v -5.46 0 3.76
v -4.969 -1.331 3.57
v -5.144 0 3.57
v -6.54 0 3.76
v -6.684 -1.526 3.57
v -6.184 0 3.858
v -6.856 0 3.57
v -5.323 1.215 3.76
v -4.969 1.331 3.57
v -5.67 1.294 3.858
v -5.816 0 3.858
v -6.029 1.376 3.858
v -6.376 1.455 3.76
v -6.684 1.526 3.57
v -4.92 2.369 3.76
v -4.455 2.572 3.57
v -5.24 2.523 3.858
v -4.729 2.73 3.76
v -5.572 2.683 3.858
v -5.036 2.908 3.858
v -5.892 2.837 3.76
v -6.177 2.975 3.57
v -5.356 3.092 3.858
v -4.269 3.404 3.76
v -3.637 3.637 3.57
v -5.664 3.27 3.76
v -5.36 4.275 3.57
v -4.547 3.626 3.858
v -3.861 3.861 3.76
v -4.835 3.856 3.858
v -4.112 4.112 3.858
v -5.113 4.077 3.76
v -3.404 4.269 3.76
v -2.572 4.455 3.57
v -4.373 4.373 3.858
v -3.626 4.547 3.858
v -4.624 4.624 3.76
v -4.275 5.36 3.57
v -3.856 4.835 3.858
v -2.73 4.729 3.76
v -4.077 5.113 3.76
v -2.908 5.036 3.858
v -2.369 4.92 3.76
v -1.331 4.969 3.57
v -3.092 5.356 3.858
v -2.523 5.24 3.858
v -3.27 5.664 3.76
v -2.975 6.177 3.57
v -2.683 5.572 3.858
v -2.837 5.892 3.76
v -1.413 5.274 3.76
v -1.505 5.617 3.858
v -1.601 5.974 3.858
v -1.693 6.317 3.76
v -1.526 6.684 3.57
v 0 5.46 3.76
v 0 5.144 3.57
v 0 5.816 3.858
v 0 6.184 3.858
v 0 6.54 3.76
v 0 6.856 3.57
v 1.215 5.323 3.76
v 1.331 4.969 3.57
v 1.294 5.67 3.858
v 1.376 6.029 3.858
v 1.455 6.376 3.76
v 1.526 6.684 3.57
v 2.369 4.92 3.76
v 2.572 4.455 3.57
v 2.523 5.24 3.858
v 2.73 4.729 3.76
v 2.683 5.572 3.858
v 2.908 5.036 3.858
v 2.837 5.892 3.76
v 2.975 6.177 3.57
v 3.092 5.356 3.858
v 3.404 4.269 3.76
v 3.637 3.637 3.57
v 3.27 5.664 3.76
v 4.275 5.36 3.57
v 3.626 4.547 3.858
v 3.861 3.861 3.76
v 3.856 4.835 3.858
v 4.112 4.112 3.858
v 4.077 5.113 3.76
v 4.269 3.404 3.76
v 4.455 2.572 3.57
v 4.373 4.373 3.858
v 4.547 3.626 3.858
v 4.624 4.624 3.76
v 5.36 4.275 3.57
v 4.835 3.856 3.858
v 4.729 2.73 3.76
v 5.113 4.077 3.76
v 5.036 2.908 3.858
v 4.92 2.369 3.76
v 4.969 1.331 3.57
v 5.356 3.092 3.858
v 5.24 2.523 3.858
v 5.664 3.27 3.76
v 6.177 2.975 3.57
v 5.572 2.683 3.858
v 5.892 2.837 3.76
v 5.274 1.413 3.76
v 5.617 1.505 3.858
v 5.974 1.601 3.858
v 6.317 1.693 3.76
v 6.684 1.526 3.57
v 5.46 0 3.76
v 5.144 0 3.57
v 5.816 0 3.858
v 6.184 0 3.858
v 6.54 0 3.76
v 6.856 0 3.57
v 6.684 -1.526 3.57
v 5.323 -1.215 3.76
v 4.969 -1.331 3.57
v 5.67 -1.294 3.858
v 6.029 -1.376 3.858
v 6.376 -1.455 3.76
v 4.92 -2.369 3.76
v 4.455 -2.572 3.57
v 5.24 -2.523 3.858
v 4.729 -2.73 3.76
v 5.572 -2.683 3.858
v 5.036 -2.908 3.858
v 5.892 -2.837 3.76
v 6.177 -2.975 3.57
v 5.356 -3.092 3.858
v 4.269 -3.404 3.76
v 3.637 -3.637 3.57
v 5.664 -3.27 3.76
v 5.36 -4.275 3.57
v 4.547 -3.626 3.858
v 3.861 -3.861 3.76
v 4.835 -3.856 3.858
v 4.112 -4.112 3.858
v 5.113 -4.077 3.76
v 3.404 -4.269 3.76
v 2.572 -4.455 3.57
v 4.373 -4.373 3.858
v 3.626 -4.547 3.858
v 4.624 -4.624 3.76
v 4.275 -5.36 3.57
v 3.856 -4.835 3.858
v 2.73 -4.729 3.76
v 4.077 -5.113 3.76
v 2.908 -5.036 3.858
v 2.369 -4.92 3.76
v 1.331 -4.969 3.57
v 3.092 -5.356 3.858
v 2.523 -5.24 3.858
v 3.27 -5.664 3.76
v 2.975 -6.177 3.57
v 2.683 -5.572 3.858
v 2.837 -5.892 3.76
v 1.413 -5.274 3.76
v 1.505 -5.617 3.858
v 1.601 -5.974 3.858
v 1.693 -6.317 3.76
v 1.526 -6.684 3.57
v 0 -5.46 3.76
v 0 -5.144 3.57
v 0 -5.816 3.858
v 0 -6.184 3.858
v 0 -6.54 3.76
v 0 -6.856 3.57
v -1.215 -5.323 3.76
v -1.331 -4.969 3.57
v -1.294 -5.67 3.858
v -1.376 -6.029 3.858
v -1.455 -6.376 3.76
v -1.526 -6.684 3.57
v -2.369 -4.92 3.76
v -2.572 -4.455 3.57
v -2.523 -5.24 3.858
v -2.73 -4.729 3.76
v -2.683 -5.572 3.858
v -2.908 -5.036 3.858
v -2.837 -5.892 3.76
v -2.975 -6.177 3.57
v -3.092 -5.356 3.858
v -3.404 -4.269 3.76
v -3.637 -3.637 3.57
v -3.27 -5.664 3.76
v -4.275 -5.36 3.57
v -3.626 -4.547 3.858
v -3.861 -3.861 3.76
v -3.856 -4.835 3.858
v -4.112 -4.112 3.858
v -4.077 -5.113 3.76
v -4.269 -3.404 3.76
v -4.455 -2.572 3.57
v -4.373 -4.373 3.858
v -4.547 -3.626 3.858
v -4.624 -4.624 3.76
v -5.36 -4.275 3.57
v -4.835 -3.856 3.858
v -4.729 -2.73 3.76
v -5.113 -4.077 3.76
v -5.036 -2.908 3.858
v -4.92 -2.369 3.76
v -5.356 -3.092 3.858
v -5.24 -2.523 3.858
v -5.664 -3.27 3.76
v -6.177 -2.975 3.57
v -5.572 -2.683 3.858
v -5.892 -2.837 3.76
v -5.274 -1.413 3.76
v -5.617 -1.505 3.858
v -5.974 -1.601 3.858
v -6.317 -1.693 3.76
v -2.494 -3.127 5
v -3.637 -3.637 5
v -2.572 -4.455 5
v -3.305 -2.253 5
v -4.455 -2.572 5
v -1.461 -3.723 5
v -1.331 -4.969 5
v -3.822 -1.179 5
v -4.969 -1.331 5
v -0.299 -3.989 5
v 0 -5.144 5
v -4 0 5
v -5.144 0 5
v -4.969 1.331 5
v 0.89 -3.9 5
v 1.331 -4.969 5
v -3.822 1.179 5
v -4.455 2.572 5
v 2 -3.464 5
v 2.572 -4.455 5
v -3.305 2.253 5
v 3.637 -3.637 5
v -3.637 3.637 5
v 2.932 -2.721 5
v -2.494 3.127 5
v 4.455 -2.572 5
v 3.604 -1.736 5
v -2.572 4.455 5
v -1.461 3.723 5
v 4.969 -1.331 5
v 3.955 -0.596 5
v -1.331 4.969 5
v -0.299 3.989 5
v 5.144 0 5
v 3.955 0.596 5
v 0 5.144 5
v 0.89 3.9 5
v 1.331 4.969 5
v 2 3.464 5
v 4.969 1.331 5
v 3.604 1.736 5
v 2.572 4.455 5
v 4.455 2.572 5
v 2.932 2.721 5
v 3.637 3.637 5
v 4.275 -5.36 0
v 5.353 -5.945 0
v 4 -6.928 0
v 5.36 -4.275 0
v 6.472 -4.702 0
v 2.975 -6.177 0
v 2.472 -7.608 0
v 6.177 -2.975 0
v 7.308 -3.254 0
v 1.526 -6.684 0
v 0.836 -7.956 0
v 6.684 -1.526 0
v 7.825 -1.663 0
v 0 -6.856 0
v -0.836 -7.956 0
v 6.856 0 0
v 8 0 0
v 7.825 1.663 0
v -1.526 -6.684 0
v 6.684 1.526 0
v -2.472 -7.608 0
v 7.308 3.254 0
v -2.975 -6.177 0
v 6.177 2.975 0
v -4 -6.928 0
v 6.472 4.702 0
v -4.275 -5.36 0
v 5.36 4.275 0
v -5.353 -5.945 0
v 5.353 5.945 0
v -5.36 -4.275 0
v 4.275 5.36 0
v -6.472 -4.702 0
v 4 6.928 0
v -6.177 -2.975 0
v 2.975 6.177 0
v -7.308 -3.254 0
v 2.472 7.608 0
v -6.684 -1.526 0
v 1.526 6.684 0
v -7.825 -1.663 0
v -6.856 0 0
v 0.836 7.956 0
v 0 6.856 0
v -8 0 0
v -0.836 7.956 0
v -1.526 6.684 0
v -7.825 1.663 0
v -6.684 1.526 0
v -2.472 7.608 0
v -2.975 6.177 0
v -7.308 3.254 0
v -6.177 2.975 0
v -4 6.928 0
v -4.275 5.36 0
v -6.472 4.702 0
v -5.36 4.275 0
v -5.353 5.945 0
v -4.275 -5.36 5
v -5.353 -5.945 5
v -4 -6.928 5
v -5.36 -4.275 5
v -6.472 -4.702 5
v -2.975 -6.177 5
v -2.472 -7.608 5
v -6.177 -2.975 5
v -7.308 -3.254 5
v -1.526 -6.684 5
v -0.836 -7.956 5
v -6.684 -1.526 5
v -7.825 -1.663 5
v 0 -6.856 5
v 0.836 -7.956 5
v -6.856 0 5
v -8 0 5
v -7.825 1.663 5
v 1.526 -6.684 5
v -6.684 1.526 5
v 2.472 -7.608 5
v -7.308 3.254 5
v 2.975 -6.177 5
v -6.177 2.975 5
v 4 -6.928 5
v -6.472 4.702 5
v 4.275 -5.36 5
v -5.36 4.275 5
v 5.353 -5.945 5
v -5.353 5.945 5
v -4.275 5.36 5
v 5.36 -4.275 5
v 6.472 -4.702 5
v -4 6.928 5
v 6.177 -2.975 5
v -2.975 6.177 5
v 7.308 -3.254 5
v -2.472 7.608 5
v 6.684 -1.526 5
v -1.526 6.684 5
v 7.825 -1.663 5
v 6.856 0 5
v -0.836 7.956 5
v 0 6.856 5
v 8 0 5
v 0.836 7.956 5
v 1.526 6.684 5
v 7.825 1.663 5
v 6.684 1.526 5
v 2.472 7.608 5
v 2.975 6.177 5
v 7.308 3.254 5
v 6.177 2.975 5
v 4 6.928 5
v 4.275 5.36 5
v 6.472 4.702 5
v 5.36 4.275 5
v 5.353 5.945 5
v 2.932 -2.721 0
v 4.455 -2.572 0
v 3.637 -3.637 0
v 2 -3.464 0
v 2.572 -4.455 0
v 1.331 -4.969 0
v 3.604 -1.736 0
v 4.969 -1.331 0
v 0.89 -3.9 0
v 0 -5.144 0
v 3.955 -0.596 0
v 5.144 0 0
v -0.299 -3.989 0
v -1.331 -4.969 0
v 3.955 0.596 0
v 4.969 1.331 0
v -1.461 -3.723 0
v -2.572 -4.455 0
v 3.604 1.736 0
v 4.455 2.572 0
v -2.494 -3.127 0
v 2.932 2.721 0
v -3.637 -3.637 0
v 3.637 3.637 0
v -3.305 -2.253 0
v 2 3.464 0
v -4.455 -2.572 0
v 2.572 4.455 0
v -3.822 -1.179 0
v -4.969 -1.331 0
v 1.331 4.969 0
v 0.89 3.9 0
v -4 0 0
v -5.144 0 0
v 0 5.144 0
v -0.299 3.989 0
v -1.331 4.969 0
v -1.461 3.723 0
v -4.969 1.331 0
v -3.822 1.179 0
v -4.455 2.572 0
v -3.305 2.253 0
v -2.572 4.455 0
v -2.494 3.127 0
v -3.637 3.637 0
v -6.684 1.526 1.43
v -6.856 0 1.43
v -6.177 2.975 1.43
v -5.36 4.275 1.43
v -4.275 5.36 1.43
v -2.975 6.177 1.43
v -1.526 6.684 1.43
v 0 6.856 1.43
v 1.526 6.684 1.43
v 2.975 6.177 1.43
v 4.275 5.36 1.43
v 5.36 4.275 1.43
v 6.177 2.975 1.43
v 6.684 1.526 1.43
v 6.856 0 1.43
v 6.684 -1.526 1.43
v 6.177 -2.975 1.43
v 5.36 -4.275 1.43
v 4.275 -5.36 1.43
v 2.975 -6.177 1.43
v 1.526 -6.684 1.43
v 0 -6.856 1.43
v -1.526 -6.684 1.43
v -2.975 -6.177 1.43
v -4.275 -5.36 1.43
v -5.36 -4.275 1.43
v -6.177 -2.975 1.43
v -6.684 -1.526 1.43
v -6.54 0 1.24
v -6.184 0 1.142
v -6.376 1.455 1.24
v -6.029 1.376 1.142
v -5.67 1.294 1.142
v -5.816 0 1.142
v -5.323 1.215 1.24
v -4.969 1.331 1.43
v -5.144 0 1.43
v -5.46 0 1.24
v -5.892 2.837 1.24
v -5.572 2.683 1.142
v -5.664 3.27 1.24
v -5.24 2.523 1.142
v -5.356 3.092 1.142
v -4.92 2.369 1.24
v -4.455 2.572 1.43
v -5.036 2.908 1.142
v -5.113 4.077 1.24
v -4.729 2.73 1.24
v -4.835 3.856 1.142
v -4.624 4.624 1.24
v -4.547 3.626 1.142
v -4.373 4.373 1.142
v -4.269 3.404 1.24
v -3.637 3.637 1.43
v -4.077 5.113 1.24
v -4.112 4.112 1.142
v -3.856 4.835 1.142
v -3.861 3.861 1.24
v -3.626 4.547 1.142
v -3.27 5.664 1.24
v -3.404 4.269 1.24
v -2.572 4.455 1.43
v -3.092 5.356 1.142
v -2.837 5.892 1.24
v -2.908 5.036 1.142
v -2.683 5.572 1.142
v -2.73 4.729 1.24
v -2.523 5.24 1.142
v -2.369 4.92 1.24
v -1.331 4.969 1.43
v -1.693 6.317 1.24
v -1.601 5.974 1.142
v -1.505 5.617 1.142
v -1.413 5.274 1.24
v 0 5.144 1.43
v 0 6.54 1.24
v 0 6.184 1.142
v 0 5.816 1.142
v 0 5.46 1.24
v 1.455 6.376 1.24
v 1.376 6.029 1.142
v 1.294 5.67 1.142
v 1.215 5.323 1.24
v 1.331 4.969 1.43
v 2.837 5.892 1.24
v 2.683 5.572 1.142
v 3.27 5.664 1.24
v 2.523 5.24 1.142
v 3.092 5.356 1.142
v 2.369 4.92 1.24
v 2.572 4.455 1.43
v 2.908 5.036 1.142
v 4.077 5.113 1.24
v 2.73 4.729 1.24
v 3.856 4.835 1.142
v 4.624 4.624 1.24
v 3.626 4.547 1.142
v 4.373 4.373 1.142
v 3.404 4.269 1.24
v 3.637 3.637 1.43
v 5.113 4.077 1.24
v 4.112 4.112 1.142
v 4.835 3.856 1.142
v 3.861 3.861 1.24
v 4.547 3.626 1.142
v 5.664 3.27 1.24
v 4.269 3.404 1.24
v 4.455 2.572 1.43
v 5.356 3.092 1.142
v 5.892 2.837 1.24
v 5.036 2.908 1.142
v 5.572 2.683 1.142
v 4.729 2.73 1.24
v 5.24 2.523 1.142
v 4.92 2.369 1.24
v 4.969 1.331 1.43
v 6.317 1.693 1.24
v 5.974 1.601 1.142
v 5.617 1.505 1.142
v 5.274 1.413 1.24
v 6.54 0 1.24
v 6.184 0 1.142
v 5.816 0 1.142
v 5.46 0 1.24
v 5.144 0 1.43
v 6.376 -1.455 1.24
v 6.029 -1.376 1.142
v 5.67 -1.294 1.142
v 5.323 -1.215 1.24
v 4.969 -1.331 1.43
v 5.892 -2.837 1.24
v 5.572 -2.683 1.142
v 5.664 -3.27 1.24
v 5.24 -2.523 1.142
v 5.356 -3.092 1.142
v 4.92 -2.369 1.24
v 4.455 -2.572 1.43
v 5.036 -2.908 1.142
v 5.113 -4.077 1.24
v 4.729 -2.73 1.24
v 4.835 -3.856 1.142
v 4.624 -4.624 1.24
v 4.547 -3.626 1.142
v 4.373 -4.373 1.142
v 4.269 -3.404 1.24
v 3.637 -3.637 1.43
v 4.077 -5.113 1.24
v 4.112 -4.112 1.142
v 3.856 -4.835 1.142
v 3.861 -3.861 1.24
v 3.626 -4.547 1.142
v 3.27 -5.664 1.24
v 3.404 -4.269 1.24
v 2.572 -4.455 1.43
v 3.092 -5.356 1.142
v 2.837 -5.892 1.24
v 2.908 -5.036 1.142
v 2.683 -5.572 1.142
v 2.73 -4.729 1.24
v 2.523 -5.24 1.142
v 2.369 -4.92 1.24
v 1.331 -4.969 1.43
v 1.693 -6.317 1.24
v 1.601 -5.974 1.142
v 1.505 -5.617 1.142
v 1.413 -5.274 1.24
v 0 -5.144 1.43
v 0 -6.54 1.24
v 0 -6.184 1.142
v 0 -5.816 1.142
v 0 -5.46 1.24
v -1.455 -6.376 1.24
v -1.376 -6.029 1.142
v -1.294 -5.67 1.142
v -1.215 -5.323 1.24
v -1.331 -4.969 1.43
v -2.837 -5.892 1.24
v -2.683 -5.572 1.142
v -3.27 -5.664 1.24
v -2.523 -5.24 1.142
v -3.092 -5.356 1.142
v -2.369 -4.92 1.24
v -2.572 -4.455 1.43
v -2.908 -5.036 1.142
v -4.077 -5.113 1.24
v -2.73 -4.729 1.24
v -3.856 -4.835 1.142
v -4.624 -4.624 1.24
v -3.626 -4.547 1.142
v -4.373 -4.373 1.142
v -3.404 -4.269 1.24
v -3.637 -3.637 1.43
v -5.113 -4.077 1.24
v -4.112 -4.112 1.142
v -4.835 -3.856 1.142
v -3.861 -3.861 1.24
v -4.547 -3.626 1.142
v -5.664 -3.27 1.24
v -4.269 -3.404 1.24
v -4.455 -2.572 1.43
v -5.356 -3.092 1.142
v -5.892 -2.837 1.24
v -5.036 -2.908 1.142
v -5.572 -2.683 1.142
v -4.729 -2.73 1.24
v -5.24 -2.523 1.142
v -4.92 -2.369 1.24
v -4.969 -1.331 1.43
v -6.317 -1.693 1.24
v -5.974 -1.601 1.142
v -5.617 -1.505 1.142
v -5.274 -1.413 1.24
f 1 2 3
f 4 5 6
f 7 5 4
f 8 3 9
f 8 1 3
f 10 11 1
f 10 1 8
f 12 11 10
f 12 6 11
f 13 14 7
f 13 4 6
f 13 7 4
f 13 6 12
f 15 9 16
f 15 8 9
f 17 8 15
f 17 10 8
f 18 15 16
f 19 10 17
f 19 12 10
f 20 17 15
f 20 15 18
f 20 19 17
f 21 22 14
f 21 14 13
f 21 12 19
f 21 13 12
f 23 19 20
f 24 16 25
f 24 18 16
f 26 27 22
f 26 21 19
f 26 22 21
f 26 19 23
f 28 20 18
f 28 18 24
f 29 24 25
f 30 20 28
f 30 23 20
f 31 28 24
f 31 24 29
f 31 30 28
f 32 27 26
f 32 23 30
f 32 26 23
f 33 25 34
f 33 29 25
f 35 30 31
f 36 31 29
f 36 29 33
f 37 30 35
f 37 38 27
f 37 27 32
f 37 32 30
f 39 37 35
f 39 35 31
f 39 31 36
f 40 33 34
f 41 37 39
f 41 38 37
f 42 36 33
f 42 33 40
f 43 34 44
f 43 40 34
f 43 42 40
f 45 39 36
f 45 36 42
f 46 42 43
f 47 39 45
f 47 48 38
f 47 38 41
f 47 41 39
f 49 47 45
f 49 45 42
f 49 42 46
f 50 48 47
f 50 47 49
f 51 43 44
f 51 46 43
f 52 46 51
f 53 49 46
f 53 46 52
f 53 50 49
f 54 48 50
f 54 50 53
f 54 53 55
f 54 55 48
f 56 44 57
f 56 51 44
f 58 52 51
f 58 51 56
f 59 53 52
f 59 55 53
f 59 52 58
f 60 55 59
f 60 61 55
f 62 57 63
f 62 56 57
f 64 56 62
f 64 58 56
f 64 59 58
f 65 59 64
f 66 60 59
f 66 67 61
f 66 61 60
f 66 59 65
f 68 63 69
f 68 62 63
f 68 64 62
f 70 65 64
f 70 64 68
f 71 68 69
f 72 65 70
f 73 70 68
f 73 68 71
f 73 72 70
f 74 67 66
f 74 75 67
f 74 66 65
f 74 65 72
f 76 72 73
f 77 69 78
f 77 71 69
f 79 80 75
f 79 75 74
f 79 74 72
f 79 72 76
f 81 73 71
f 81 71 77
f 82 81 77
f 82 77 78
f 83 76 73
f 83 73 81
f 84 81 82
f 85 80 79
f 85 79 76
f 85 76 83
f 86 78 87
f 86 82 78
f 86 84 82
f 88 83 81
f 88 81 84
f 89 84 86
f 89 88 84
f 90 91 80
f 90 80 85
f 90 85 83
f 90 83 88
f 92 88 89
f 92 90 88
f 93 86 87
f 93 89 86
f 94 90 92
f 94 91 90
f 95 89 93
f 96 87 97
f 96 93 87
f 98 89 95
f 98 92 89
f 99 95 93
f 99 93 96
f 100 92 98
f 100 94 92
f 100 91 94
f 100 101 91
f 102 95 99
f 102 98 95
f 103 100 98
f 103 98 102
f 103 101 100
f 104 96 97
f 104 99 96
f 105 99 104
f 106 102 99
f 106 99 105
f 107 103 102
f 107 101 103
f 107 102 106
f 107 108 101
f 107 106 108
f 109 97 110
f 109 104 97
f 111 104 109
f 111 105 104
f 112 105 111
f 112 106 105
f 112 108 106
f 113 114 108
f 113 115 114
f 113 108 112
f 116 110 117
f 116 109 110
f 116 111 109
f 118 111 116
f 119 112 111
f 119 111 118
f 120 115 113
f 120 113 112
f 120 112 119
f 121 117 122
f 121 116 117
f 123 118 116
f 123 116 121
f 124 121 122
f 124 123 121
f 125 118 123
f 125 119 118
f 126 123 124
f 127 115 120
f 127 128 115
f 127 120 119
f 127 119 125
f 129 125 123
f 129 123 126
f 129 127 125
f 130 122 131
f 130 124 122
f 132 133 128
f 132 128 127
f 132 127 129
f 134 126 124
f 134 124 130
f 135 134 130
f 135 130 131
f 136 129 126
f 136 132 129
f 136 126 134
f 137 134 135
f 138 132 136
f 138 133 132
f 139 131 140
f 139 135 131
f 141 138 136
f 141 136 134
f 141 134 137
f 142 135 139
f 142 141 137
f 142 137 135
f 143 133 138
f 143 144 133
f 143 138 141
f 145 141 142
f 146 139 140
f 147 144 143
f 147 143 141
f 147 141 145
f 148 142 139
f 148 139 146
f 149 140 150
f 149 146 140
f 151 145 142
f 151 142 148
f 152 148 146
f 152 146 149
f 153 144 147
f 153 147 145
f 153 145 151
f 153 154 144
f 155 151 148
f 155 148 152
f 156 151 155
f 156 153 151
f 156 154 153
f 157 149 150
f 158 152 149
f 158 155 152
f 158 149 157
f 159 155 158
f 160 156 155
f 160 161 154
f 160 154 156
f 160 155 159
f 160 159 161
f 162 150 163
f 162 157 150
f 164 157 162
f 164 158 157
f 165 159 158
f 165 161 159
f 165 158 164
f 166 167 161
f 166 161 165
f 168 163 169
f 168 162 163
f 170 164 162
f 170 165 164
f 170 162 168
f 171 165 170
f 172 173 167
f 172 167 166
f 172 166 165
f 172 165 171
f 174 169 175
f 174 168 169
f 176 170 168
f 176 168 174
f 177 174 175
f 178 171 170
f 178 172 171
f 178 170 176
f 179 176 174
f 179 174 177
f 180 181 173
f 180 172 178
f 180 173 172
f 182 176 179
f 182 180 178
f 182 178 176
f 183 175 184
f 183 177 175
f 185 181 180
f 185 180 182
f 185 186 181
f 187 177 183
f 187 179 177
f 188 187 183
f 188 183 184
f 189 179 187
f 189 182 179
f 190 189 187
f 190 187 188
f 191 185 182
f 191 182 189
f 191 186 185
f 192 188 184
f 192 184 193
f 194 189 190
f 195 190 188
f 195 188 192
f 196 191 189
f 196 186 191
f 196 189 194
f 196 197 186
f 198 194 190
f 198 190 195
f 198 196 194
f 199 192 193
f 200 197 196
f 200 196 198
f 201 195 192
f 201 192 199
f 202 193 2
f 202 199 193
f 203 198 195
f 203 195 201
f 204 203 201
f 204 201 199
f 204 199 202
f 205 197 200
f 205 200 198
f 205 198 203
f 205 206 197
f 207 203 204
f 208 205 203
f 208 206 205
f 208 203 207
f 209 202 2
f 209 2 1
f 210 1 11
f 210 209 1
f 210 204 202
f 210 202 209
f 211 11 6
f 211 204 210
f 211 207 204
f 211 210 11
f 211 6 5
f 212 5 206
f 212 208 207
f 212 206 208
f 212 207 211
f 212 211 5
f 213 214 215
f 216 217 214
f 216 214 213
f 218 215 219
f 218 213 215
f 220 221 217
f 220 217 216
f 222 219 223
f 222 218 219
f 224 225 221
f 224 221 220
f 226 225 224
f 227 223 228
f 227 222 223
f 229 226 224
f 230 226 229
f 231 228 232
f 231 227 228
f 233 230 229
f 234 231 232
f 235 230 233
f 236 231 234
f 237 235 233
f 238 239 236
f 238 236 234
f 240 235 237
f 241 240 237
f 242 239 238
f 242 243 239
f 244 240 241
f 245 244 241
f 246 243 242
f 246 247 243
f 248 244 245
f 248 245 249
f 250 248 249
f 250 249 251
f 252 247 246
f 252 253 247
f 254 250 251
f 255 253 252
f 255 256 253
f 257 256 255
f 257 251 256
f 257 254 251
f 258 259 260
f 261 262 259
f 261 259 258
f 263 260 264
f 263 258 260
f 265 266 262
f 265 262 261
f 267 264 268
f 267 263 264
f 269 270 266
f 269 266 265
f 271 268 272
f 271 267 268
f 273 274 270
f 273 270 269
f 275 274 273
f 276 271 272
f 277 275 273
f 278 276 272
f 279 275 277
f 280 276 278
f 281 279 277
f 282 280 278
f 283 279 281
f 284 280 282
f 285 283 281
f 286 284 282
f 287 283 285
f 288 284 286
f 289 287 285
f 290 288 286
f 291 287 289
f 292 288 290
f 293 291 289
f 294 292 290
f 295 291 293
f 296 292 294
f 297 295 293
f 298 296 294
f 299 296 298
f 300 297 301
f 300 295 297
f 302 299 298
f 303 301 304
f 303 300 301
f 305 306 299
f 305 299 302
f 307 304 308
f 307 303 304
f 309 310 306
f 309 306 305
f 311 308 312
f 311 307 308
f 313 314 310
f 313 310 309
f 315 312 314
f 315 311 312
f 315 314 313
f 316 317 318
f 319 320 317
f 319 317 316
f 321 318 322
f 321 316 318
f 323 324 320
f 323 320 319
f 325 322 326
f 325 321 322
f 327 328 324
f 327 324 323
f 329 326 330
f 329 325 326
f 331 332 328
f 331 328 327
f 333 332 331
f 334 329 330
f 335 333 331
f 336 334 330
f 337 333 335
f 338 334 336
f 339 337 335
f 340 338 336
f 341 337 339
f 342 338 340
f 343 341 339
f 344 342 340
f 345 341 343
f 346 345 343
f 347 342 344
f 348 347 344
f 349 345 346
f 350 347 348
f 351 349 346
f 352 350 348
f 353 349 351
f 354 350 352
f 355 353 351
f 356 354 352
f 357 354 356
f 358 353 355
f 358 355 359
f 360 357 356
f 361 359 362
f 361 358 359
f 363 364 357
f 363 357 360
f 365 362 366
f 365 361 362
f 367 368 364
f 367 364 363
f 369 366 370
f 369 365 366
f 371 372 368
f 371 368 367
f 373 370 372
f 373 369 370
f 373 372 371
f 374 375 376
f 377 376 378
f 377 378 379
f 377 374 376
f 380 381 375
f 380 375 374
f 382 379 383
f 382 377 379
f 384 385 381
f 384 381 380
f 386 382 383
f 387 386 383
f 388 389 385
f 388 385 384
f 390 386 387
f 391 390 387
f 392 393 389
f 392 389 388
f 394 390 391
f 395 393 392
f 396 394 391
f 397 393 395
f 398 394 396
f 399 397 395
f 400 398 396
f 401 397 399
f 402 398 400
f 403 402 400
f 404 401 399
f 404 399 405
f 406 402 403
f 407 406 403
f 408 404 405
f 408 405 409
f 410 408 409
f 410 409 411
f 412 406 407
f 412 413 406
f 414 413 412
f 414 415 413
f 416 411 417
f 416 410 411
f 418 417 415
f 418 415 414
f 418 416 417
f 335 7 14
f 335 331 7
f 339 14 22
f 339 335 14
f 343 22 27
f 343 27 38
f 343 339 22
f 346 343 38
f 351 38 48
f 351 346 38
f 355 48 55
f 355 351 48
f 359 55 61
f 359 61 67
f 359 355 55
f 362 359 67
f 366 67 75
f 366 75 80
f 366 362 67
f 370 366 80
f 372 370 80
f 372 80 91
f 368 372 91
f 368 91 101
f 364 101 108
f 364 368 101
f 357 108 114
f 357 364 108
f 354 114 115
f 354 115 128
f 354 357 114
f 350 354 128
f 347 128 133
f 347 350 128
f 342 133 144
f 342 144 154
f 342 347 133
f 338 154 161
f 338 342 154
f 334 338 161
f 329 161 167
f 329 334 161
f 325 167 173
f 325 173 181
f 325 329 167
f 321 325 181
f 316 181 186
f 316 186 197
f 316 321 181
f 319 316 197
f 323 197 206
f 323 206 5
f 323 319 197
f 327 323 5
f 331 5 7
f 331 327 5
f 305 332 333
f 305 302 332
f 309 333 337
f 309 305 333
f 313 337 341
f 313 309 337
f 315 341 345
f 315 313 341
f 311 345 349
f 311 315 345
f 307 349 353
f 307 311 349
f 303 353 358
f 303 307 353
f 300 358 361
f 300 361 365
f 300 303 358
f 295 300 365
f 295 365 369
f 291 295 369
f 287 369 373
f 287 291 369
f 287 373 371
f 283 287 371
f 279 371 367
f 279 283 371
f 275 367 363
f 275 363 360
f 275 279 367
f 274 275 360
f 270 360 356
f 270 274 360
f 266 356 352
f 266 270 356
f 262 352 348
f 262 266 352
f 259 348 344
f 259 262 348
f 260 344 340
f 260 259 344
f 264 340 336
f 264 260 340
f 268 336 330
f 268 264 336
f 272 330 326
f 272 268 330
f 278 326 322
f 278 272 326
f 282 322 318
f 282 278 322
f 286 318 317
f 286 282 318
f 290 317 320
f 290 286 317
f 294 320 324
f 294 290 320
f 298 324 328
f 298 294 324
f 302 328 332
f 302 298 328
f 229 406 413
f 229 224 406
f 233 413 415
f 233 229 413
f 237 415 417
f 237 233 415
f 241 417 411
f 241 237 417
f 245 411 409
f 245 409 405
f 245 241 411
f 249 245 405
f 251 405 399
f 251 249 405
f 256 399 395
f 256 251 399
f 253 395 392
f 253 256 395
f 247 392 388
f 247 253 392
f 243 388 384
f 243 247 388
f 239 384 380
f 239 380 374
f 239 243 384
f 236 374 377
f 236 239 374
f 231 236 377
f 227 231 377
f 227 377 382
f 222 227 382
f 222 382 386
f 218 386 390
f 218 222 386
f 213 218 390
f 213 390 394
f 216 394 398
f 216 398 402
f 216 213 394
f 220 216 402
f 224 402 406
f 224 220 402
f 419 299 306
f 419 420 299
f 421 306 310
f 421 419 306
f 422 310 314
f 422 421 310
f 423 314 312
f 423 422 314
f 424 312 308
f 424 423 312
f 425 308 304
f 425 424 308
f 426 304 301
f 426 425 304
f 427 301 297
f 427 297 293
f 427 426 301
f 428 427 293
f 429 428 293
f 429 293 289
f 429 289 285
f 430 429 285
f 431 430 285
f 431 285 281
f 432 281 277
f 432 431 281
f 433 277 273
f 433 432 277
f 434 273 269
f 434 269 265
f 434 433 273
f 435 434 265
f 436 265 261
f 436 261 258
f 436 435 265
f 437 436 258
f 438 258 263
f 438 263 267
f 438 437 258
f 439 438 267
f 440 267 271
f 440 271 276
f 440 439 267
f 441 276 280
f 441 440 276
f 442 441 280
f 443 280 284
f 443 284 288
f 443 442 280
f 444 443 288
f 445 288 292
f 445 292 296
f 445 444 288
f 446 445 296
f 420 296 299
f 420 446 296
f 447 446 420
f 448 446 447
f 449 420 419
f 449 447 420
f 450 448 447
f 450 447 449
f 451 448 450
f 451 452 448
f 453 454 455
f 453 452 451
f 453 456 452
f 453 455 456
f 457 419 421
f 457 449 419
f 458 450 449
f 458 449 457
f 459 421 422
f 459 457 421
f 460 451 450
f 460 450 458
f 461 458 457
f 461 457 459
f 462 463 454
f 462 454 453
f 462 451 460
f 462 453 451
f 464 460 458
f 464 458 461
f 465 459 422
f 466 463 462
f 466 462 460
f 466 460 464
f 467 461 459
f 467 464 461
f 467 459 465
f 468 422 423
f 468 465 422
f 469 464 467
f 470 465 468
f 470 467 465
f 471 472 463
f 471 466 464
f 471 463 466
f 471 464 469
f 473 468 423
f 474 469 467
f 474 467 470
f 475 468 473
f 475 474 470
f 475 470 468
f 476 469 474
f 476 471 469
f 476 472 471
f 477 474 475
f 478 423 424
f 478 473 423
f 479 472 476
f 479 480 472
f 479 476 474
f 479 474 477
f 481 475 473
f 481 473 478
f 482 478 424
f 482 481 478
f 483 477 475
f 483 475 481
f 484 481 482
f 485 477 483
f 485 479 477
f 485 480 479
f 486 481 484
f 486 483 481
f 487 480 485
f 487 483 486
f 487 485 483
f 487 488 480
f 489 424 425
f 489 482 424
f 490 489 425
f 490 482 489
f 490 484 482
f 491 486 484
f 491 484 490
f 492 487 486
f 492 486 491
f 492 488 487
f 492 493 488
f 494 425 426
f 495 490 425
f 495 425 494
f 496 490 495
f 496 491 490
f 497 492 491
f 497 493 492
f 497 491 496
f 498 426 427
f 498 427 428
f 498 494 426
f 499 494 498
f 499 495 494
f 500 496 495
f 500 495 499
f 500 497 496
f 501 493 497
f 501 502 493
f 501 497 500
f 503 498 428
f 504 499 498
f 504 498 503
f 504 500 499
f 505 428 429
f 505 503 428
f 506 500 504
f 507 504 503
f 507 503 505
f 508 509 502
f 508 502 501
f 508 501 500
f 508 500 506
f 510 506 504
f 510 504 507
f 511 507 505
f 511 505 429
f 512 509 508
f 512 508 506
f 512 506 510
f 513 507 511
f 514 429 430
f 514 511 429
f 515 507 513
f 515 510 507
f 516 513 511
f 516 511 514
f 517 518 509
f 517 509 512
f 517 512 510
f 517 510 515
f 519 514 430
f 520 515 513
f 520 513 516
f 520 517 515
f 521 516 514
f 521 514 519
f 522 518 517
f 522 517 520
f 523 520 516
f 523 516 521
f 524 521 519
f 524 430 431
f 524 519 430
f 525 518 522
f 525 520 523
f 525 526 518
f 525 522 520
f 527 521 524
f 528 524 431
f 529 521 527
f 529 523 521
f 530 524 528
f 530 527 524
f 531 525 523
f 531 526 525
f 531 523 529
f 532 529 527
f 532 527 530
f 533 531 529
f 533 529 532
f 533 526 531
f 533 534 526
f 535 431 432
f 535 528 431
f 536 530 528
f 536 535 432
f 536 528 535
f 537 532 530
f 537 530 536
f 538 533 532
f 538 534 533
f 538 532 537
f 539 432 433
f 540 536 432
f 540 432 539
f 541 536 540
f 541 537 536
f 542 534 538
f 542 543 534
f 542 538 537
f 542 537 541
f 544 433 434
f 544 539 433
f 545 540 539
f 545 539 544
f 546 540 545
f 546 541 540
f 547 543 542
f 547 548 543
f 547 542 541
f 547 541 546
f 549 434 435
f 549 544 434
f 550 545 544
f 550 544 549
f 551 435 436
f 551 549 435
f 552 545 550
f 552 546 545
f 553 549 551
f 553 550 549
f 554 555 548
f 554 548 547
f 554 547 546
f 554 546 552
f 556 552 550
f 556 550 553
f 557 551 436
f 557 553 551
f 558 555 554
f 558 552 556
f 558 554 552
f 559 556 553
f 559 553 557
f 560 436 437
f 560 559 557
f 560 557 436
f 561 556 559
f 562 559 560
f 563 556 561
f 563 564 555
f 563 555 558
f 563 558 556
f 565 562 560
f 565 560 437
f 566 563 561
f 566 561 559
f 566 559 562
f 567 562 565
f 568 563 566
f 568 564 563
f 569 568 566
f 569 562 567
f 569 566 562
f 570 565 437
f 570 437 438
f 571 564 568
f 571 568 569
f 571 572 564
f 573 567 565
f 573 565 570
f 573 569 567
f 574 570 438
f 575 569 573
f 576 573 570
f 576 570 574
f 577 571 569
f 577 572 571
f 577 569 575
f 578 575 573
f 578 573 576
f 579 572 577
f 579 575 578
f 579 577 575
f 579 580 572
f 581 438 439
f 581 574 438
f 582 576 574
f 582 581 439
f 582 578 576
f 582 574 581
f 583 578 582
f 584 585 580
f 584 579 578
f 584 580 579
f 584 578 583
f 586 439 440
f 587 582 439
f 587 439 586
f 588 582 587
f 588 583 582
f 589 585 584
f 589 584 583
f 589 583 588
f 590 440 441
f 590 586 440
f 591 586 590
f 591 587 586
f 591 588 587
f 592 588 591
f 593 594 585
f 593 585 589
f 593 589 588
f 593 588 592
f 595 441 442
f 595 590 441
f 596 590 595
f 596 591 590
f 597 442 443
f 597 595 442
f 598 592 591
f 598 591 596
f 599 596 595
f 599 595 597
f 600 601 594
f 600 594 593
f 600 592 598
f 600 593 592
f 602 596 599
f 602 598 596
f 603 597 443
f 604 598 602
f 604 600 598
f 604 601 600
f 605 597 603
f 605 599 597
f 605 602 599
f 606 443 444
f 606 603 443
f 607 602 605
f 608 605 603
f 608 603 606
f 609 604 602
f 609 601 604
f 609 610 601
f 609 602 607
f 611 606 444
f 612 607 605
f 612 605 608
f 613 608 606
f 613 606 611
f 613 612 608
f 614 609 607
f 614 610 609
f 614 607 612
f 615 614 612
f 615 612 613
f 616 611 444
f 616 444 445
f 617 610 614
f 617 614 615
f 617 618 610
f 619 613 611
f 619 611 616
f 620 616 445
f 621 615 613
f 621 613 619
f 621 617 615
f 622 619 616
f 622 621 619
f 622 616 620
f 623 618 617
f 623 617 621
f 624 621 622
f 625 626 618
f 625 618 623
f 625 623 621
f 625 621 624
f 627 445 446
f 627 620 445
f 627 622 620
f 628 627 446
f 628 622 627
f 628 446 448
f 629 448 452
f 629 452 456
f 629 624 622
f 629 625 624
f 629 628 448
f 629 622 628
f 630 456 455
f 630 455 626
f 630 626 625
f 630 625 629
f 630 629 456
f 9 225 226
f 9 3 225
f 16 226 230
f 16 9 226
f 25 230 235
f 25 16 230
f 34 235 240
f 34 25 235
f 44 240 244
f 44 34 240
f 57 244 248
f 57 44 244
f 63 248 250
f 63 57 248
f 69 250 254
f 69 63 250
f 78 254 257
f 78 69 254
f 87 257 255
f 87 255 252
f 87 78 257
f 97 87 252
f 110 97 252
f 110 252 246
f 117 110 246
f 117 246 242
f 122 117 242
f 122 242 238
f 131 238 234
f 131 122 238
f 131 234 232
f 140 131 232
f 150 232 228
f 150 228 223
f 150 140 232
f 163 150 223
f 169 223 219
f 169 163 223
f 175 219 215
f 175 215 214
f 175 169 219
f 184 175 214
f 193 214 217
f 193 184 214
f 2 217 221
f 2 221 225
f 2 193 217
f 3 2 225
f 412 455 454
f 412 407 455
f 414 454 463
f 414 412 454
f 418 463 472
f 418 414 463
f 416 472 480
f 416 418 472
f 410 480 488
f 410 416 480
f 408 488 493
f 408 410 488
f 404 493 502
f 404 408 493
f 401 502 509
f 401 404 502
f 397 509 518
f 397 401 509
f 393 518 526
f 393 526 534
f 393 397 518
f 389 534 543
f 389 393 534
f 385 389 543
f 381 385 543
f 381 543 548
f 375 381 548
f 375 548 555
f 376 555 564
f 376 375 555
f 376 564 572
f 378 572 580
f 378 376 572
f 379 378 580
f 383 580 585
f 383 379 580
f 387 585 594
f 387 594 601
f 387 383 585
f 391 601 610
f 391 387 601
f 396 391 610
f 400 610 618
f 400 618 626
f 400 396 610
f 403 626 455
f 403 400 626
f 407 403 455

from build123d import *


with BuildPart() as f1:
    # F0 (on Front) → F1 (revolve)
    with BuildSketch(Plane.XZ):
        with BuildLine():
            Line((-6.856, 5), (-8, 5))
            Line((-8, 5), (-8, 0))
            Line((-8, 0), (-6.856, 0))
            Line((-6.856, 0), (-6.856, 1.43))
            ThreePointArc((-6.856, 1.43), (-6, 1.1297314132), (-5.144, 1.43))
            Line((-5.144, 1.43), (-5.144, 0))
            Line((-5.144, 0), (-4, 0))
            Line((-4, 0), (-4, 5))
            Line((-4, 5), (-5.144, 5))
            Line((-5.144, 5), (-5.144, 3.57))
            ThreePointArc((-5.144, 3.57), (-6, 3.8702685868), (-6.856, 3.57))
            Line((-6.856, 3.57), (-6.856, 5))
        make_face()
    revolve(axis=Axis((0, 0, 1.894922927), (0, 0, -1)))


solid = f1.part
